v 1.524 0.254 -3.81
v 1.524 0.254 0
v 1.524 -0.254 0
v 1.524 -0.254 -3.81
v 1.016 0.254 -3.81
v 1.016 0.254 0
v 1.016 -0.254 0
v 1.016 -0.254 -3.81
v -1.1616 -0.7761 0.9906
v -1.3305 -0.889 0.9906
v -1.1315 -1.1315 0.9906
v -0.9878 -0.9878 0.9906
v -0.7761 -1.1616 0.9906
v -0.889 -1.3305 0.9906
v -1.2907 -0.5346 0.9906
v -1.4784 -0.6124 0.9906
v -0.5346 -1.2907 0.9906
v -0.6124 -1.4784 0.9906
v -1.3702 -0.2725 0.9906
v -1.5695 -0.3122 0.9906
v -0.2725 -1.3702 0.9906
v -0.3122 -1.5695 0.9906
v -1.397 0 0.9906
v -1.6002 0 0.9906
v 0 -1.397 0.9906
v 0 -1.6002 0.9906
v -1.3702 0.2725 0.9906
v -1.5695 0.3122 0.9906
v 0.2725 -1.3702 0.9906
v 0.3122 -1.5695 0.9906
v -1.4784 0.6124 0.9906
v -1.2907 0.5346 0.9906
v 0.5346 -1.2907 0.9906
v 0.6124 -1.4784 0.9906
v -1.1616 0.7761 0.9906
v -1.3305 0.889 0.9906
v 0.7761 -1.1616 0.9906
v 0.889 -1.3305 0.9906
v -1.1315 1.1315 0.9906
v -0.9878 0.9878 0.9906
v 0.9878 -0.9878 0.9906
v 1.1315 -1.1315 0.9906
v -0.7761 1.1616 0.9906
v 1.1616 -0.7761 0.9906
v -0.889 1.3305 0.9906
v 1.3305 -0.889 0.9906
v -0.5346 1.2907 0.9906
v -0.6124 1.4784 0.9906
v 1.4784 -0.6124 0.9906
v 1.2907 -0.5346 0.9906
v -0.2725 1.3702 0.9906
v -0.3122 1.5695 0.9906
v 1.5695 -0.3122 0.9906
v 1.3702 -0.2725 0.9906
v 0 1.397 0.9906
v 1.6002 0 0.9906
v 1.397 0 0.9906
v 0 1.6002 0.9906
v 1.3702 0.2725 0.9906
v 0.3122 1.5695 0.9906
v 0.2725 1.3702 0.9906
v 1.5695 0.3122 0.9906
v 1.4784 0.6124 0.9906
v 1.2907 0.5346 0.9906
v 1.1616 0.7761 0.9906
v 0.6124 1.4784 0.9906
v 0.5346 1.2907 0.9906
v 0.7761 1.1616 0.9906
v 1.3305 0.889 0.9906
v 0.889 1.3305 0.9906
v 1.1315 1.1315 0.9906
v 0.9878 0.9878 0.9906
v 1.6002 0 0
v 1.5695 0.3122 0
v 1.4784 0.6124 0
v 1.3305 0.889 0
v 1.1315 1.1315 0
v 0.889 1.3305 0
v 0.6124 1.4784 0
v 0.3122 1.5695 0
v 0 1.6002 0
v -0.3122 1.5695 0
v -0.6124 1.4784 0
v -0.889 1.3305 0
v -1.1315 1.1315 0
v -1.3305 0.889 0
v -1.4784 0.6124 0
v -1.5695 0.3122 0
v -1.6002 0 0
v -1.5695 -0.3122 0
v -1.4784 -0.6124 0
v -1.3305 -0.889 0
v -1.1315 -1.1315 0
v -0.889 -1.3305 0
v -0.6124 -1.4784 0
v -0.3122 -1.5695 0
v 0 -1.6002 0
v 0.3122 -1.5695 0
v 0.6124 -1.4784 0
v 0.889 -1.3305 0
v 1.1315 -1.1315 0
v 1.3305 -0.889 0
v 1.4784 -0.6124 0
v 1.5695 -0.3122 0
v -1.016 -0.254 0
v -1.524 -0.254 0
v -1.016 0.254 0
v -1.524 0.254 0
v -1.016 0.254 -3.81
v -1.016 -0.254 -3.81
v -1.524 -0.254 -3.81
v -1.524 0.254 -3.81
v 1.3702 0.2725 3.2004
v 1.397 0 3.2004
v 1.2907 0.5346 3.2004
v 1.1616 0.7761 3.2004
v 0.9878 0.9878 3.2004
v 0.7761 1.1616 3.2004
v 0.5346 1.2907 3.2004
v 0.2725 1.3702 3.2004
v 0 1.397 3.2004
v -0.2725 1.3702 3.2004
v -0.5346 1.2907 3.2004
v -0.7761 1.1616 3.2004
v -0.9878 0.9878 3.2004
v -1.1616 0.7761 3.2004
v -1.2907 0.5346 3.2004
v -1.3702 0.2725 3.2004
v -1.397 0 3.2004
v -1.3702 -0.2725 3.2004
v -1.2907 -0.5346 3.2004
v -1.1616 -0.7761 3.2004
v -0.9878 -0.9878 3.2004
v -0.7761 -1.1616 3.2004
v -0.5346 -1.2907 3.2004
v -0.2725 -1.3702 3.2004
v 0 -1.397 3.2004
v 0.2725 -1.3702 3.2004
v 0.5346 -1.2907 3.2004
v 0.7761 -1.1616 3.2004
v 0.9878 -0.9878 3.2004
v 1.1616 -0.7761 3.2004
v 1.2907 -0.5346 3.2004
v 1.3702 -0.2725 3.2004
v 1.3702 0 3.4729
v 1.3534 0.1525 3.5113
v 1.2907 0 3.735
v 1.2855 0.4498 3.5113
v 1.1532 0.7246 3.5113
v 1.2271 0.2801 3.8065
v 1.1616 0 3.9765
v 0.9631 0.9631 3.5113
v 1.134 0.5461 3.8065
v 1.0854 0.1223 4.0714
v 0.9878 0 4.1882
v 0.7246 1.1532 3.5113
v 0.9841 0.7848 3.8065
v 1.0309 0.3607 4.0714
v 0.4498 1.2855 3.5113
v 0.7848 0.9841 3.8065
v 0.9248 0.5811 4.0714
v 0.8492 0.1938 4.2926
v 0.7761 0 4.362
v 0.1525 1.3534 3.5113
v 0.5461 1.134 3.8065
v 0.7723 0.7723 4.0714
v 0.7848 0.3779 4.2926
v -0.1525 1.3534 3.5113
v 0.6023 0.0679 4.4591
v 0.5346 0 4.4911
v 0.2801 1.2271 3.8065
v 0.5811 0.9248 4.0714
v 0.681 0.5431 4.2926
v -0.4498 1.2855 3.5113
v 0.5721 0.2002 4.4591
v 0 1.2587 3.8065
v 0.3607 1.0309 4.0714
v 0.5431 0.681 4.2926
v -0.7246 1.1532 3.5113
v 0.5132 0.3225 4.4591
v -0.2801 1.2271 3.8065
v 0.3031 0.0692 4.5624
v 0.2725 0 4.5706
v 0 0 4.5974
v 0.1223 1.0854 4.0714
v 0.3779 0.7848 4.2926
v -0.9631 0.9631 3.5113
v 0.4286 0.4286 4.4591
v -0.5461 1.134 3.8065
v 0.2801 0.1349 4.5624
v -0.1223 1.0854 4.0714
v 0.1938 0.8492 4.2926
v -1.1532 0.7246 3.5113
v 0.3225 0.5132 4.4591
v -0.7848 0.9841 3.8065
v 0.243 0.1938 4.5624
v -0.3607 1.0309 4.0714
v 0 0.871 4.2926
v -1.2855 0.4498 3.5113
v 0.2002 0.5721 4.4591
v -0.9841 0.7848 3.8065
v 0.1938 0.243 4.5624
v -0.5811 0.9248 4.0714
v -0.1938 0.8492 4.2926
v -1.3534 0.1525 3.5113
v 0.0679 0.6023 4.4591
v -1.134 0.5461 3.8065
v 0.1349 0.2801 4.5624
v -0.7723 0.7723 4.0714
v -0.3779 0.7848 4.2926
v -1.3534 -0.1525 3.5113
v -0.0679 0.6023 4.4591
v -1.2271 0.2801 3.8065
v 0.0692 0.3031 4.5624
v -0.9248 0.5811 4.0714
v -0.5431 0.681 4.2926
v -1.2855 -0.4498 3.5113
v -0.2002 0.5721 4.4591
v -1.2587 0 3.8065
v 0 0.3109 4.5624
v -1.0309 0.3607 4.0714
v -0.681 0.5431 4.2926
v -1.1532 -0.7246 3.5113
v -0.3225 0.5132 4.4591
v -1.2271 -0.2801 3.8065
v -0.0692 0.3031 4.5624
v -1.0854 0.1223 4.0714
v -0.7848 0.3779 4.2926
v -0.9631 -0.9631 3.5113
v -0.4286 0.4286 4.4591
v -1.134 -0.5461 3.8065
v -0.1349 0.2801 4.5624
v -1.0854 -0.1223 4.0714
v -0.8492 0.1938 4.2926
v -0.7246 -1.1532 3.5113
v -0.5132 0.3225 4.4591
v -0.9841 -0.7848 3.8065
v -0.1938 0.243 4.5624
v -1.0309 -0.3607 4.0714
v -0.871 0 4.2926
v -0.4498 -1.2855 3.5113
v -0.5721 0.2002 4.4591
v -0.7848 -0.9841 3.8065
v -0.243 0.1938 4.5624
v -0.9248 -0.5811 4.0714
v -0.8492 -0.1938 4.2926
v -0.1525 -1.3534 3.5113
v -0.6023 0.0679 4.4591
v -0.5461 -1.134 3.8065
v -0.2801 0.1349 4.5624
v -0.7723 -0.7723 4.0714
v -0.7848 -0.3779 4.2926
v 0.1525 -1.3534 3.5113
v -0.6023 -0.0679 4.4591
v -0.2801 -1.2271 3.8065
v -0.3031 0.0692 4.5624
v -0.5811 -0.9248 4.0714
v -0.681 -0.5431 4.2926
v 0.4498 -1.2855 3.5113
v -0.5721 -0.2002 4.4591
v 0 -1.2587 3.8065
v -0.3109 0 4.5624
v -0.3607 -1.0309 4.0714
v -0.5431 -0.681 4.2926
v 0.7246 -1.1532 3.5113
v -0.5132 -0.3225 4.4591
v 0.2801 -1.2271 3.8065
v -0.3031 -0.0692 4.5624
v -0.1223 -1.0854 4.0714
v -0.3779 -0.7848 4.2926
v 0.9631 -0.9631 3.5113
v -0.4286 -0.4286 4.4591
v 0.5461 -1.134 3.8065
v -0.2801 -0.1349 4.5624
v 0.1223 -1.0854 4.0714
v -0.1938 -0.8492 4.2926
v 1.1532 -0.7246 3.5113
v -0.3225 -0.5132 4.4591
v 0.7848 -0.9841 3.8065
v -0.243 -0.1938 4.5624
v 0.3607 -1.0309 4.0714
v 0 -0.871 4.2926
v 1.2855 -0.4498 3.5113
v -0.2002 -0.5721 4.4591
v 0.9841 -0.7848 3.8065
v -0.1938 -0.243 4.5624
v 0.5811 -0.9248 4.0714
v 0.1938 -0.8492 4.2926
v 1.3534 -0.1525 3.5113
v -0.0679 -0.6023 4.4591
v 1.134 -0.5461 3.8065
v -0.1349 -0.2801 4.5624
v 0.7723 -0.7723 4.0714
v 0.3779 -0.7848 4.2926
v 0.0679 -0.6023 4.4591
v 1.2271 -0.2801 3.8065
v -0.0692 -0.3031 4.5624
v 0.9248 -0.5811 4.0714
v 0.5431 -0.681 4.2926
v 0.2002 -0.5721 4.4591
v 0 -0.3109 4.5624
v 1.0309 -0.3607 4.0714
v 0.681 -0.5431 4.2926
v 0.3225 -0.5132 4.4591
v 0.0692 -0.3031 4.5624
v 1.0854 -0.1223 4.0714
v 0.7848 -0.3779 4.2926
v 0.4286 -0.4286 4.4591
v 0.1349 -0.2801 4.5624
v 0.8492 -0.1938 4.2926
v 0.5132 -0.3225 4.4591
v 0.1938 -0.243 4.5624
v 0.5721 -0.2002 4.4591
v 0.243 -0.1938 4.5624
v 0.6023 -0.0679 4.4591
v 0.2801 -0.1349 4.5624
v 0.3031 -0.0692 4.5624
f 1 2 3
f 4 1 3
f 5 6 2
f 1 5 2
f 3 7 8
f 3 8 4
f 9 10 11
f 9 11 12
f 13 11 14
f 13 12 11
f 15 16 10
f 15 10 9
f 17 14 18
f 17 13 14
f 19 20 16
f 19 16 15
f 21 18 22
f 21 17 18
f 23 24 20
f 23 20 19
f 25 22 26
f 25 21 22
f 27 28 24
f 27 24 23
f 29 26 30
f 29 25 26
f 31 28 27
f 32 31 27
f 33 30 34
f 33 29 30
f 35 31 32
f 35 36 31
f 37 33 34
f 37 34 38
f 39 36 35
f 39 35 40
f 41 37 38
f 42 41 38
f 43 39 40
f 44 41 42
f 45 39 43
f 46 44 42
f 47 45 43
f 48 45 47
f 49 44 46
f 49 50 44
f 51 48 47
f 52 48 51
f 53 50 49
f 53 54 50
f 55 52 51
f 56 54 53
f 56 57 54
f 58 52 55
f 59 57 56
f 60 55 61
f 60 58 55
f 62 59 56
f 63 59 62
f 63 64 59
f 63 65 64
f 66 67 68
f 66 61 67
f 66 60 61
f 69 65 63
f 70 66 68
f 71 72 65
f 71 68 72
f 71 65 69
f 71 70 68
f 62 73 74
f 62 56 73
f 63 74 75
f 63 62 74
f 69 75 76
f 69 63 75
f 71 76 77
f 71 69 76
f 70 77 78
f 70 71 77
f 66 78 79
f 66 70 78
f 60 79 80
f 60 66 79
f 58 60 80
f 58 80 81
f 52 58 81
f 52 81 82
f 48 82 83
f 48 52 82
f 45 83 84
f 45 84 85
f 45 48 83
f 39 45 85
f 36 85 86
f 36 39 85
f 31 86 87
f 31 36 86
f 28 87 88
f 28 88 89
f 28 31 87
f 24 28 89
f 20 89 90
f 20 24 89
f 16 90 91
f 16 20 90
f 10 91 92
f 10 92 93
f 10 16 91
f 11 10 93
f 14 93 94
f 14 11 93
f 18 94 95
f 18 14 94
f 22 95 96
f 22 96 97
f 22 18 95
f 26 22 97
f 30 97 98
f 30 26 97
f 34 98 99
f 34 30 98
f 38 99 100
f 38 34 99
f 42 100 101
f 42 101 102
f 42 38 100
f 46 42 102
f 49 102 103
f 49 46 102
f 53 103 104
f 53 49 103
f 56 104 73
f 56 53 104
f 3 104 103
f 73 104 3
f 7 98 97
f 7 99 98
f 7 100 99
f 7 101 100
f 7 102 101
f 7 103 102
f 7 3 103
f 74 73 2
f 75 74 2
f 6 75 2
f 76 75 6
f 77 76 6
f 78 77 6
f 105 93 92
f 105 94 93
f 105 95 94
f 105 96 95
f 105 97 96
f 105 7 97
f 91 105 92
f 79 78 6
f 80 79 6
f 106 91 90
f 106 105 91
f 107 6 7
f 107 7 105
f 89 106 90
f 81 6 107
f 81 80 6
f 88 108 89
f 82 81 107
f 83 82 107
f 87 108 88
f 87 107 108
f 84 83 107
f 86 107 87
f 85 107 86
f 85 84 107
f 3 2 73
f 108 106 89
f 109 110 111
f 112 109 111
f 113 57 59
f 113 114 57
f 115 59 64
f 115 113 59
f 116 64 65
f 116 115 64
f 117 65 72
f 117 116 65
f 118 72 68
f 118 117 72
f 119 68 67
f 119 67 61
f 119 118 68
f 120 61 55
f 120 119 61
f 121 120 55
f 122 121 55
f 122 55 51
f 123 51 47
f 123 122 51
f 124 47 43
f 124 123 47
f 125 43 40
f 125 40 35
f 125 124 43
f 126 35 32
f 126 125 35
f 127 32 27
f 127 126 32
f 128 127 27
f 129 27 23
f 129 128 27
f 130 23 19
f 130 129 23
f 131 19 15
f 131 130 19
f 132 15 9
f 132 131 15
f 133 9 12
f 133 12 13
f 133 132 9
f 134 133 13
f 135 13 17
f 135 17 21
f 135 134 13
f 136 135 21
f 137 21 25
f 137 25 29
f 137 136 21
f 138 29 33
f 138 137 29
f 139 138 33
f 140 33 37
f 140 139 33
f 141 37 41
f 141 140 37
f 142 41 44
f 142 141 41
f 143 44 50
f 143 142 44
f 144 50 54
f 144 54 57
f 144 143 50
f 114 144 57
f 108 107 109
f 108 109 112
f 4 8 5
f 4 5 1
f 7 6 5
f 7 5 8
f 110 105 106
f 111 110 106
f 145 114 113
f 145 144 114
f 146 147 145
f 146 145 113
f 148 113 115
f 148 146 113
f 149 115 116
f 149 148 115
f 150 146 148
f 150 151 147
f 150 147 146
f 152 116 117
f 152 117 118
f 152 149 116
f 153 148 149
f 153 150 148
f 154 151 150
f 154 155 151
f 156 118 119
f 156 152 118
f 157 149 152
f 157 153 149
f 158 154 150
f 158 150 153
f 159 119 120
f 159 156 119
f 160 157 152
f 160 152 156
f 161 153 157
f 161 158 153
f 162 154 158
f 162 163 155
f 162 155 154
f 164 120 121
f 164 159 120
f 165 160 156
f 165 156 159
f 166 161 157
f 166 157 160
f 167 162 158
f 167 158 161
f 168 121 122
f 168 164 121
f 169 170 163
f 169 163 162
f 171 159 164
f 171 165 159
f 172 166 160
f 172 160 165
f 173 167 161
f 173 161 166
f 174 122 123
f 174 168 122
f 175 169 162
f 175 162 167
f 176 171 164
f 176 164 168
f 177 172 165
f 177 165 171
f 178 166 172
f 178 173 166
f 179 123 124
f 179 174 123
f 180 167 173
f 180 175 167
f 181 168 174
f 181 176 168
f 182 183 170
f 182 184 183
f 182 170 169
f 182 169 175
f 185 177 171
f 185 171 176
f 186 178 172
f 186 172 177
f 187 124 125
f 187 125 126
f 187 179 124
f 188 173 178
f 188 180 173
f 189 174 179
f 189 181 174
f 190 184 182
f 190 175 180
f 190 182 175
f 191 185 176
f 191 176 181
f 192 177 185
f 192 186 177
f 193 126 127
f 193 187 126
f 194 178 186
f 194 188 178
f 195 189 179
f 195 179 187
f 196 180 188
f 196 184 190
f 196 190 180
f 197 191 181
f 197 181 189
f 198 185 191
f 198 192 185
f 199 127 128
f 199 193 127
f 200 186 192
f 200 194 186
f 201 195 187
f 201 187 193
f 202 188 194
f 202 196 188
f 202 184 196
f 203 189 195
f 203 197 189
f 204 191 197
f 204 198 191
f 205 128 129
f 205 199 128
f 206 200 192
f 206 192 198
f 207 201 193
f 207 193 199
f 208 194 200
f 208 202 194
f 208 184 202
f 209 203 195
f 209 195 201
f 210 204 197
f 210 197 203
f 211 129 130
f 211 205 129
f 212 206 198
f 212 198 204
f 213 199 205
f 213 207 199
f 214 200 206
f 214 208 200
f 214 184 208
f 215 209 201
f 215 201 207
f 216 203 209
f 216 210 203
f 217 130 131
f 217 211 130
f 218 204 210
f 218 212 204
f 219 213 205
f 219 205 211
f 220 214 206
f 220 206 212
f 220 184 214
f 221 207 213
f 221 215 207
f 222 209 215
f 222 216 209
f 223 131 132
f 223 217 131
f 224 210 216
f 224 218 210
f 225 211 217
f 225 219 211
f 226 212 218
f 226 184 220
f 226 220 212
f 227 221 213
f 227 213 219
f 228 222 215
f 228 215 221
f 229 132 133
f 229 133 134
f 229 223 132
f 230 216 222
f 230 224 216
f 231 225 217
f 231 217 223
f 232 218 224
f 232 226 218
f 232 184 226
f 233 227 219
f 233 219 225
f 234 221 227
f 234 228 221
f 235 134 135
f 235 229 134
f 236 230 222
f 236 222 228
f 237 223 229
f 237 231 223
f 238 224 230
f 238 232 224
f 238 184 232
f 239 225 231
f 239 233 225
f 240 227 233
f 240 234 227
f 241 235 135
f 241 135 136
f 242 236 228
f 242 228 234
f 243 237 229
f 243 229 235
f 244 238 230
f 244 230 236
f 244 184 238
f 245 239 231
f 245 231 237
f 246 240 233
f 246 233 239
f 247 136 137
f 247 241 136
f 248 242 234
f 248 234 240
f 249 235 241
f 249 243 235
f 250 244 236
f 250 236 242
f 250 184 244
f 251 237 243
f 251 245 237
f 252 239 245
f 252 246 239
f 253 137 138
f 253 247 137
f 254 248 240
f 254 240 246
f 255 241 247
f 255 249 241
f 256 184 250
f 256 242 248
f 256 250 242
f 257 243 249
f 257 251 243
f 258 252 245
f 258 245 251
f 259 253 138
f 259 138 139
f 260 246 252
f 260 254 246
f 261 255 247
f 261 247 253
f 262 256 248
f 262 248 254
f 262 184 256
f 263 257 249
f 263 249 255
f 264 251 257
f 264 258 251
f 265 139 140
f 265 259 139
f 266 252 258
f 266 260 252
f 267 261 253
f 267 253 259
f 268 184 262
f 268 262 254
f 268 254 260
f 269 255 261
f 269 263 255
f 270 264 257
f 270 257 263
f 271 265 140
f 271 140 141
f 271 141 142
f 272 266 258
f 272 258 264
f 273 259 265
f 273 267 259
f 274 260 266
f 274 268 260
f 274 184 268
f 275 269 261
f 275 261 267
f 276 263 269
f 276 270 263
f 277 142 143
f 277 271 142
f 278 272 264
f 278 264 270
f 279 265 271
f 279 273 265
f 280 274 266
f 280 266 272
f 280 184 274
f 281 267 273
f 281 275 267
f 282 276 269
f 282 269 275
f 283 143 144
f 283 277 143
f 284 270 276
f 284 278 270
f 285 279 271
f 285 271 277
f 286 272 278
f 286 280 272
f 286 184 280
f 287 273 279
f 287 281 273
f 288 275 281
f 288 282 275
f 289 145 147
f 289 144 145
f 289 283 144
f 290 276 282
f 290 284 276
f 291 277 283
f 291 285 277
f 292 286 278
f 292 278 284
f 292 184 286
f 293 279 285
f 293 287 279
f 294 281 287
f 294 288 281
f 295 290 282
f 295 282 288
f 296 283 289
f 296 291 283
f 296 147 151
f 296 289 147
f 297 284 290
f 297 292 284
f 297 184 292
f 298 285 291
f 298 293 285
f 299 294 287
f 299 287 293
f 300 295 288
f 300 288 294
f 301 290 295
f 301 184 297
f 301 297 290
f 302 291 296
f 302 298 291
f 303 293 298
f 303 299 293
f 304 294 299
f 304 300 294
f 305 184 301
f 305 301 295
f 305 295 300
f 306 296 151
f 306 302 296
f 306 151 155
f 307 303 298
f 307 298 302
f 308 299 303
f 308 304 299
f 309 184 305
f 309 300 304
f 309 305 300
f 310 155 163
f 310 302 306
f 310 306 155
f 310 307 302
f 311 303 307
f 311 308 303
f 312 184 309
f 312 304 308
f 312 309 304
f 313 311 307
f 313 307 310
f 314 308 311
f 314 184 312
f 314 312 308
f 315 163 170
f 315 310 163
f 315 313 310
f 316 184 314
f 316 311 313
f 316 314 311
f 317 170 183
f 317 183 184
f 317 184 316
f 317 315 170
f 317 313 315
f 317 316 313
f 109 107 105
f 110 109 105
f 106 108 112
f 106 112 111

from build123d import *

# Parameters (mm, degrees)
F2_W     = 0.508
F2_H     = 0.508
F3_DEPTH = 3.81


# Not quite as in the source:
# - a pattern or mirror of a feature is missing from the dataset's text; its kind, count and spacing are read off the source's solid


with BuildPart() as f1:
    # F0 (on Front) → F1 (revolve)
    with BuildSketch(Plane.XZ):
        with BuildLine():
            Line((0, 4.5974), (0, 0))
            Line((0, 0), (1.6002, 0))
            Line((1.6002, 0), (1.6002, 0.9906))
            Line((1.6002, 0.9906), (1.397, 0.9906))
            Line((1.397, 0.9906), (1.397, 3.2004))
            ThreePointArc((1.397, 3.2004), (0.9878281733, 4.1882281733), (0, 4.5974))
        make_face()
    revolve(axis=Axis((0, 0, 2.2987), (0, 0, 1)))

    # F2 (on face) → F3 (join)
    with BuildSketch(Plane(origin=(0, 0, 0), x_dir=(1, 0, 0), z_dir=(0, 0, -1))):
        with Locations((1.27, 0)):
            Rectangle(F2_W, F2_H)
    f3 = extrude(amount=F3_DEPTH)

    # F3_copies: F3 across plane
    add(f3.mirror(Plane(origin=(0, 0, 0), x_dir=(0, 0, -1), z_dir=(-1, 0, 0))))


solid = f1.part
